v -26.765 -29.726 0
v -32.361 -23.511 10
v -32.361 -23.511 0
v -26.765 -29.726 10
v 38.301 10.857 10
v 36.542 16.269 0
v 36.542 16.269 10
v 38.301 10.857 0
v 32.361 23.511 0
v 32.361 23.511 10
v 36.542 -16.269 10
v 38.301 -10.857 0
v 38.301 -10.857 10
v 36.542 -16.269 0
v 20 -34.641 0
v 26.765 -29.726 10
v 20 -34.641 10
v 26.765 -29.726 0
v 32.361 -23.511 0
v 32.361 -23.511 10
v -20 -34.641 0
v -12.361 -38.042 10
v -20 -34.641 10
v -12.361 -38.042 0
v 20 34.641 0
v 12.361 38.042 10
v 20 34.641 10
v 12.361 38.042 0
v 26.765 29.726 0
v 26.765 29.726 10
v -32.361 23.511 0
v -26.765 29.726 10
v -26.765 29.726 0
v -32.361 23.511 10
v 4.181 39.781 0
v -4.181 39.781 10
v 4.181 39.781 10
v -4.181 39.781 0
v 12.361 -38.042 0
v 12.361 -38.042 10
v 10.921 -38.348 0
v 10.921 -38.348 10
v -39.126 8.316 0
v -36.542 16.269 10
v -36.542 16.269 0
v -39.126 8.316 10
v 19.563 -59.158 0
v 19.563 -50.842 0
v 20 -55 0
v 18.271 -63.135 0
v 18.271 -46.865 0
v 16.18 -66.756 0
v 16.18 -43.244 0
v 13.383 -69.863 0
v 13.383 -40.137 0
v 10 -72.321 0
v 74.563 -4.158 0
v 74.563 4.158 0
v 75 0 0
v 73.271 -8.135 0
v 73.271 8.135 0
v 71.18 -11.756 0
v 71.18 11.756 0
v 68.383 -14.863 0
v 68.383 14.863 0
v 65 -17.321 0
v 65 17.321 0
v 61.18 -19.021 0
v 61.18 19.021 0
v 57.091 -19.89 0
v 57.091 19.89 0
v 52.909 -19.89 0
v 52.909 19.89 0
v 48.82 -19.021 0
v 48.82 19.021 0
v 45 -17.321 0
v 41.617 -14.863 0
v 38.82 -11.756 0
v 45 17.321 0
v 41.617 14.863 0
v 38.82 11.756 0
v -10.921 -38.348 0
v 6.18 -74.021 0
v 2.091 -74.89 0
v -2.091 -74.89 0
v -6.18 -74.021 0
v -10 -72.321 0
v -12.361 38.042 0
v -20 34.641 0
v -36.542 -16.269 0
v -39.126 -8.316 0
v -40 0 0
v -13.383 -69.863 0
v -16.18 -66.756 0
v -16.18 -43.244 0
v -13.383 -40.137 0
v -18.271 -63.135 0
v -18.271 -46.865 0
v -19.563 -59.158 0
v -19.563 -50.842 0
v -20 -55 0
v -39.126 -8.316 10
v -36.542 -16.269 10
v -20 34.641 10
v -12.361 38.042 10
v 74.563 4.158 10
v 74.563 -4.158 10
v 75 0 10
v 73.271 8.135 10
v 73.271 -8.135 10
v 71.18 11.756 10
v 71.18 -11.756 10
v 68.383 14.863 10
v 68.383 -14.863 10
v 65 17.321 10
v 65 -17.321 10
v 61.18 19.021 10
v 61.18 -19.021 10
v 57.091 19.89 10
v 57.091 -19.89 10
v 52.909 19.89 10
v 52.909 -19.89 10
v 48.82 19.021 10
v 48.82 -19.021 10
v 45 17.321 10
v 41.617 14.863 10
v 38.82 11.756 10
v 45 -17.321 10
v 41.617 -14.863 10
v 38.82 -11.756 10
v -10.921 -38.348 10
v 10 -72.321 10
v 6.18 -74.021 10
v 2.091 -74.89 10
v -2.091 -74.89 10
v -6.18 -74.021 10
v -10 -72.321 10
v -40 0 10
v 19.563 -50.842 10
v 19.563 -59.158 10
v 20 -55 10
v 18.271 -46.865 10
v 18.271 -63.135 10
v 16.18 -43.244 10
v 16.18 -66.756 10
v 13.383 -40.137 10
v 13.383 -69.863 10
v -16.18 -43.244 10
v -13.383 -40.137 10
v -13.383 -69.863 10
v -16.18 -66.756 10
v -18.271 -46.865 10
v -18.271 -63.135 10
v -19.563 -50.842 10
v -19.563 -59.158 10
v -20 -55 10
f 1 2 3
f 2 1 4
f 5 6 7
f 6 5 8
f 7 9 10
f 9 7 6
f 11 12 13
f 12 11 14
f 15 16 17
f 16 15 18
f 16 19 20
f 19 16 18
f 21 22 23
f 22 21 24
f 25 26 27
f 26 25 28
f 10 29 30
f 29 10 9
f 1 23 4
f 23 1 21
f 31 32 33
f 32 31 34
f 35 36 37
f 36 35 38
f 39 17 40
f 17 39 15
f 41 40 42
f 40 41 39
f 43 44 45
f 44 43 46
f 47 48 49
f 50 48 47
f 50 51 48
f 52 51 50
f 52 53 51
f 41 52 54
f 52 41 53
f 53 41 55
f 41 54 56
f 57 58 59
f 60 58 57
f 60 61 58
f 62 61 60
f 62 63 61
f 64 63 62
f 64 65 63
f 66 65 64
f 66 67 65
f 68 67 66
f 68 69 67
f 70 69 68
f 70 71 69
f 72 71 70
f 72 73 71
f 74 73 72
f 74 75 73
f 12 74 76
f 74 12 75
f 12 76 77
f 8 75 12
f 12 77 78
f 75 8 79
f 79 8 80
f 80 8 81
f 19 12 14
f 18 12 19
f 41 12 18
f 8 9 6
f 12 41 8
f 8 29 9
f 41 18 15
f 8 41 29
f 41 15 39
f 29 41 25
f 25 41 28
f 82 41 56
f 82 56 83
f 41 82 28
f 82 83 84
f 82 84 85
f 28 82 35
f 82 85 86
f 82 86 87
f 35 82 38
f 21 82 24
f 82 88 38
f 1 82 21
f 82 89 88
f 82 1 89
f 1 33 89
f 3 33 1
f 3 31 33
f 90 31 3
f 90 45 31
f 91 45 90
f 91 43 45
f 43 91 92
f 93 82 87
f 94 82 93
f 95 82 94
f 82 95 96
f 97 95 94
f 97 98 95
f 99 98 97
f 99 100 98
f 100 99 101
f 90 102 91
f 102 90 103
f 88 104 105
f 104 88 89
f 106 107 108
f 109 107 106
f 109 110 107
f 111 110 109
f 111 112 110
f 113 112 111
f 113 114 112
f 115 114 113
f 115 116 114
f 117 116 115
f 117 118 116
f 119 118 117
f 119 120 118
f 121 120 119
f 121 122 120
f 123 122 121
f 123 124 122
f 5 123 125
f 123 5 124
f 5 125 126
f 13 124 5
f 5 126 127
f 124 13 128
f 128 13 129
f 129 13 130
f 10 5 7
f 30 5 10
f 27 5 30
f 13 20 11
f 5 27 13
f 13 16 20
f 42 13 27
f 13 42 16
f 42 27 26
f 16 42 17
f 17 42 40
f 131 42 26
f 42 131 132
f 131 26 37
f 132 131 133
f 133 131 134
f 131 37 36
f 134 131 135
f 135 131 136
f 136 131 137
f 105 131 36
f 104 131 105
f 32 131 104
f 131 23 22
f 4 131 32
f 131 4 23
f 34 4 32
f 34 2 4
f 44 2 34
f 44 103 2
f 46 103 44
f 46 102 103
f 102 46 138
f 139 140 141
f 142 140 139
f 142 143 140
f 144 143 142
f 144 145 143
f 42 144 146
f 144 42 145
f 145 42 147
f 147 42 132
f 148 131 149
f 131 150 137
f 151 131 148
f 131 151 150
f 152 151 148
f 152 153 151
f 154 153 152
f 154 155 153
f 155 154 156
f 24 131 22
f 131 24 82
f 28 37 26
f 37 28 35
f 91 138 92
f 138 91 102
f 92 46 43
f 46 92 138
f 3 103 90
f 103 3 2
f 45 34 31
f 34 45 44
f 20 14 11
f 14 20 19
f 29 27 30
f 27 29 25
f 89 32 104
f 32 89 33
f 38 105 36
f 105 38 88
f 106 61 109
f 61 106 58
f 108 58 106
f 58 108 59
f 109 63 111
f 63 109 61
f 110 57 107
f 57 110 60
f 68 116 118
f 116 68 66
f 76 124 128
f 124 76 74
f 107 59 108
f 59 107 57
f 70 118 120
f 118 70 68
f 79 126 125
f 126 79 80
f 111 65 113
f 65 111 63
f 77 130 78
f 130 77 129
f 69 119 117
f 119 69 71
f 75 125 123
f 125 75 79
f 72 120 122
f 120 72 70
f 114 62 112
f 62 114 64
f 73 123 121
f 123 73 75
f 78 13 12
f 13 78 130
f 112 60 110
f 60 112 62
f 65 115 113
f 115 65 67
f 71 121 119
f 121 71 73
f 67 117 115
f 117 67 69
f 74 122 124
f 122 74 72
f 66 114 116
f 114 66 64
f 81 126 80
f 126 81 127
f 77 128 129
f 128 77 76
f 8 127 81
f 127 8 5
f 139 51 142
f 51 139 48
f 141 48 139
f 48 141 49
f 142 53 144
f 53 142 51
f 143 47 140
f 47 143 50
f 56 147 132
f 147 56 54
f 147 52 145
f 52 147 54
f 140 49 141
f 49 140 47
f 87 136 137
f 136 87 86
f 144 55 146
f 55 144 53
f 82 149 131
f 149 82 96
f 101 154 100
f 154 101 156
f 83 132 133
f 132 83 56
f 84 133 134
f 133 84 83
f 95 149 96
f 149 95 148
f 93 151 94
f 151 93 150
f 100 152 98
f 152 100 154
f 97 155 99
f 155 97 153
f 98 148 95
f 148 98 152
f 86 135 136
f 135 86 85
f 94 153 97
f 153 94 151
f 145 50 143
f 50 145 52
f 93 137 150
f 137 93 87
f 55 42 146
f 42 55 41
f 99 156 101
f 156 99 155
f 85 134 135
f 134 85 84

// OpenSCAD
union() {
  cylinder(h = 10, r = 40);
  translate([55, 0, 0]) cylinder(h = 10, r = 20);
  translate([0, -55, 0]) cylinder(h = 10, r = 20);
}
